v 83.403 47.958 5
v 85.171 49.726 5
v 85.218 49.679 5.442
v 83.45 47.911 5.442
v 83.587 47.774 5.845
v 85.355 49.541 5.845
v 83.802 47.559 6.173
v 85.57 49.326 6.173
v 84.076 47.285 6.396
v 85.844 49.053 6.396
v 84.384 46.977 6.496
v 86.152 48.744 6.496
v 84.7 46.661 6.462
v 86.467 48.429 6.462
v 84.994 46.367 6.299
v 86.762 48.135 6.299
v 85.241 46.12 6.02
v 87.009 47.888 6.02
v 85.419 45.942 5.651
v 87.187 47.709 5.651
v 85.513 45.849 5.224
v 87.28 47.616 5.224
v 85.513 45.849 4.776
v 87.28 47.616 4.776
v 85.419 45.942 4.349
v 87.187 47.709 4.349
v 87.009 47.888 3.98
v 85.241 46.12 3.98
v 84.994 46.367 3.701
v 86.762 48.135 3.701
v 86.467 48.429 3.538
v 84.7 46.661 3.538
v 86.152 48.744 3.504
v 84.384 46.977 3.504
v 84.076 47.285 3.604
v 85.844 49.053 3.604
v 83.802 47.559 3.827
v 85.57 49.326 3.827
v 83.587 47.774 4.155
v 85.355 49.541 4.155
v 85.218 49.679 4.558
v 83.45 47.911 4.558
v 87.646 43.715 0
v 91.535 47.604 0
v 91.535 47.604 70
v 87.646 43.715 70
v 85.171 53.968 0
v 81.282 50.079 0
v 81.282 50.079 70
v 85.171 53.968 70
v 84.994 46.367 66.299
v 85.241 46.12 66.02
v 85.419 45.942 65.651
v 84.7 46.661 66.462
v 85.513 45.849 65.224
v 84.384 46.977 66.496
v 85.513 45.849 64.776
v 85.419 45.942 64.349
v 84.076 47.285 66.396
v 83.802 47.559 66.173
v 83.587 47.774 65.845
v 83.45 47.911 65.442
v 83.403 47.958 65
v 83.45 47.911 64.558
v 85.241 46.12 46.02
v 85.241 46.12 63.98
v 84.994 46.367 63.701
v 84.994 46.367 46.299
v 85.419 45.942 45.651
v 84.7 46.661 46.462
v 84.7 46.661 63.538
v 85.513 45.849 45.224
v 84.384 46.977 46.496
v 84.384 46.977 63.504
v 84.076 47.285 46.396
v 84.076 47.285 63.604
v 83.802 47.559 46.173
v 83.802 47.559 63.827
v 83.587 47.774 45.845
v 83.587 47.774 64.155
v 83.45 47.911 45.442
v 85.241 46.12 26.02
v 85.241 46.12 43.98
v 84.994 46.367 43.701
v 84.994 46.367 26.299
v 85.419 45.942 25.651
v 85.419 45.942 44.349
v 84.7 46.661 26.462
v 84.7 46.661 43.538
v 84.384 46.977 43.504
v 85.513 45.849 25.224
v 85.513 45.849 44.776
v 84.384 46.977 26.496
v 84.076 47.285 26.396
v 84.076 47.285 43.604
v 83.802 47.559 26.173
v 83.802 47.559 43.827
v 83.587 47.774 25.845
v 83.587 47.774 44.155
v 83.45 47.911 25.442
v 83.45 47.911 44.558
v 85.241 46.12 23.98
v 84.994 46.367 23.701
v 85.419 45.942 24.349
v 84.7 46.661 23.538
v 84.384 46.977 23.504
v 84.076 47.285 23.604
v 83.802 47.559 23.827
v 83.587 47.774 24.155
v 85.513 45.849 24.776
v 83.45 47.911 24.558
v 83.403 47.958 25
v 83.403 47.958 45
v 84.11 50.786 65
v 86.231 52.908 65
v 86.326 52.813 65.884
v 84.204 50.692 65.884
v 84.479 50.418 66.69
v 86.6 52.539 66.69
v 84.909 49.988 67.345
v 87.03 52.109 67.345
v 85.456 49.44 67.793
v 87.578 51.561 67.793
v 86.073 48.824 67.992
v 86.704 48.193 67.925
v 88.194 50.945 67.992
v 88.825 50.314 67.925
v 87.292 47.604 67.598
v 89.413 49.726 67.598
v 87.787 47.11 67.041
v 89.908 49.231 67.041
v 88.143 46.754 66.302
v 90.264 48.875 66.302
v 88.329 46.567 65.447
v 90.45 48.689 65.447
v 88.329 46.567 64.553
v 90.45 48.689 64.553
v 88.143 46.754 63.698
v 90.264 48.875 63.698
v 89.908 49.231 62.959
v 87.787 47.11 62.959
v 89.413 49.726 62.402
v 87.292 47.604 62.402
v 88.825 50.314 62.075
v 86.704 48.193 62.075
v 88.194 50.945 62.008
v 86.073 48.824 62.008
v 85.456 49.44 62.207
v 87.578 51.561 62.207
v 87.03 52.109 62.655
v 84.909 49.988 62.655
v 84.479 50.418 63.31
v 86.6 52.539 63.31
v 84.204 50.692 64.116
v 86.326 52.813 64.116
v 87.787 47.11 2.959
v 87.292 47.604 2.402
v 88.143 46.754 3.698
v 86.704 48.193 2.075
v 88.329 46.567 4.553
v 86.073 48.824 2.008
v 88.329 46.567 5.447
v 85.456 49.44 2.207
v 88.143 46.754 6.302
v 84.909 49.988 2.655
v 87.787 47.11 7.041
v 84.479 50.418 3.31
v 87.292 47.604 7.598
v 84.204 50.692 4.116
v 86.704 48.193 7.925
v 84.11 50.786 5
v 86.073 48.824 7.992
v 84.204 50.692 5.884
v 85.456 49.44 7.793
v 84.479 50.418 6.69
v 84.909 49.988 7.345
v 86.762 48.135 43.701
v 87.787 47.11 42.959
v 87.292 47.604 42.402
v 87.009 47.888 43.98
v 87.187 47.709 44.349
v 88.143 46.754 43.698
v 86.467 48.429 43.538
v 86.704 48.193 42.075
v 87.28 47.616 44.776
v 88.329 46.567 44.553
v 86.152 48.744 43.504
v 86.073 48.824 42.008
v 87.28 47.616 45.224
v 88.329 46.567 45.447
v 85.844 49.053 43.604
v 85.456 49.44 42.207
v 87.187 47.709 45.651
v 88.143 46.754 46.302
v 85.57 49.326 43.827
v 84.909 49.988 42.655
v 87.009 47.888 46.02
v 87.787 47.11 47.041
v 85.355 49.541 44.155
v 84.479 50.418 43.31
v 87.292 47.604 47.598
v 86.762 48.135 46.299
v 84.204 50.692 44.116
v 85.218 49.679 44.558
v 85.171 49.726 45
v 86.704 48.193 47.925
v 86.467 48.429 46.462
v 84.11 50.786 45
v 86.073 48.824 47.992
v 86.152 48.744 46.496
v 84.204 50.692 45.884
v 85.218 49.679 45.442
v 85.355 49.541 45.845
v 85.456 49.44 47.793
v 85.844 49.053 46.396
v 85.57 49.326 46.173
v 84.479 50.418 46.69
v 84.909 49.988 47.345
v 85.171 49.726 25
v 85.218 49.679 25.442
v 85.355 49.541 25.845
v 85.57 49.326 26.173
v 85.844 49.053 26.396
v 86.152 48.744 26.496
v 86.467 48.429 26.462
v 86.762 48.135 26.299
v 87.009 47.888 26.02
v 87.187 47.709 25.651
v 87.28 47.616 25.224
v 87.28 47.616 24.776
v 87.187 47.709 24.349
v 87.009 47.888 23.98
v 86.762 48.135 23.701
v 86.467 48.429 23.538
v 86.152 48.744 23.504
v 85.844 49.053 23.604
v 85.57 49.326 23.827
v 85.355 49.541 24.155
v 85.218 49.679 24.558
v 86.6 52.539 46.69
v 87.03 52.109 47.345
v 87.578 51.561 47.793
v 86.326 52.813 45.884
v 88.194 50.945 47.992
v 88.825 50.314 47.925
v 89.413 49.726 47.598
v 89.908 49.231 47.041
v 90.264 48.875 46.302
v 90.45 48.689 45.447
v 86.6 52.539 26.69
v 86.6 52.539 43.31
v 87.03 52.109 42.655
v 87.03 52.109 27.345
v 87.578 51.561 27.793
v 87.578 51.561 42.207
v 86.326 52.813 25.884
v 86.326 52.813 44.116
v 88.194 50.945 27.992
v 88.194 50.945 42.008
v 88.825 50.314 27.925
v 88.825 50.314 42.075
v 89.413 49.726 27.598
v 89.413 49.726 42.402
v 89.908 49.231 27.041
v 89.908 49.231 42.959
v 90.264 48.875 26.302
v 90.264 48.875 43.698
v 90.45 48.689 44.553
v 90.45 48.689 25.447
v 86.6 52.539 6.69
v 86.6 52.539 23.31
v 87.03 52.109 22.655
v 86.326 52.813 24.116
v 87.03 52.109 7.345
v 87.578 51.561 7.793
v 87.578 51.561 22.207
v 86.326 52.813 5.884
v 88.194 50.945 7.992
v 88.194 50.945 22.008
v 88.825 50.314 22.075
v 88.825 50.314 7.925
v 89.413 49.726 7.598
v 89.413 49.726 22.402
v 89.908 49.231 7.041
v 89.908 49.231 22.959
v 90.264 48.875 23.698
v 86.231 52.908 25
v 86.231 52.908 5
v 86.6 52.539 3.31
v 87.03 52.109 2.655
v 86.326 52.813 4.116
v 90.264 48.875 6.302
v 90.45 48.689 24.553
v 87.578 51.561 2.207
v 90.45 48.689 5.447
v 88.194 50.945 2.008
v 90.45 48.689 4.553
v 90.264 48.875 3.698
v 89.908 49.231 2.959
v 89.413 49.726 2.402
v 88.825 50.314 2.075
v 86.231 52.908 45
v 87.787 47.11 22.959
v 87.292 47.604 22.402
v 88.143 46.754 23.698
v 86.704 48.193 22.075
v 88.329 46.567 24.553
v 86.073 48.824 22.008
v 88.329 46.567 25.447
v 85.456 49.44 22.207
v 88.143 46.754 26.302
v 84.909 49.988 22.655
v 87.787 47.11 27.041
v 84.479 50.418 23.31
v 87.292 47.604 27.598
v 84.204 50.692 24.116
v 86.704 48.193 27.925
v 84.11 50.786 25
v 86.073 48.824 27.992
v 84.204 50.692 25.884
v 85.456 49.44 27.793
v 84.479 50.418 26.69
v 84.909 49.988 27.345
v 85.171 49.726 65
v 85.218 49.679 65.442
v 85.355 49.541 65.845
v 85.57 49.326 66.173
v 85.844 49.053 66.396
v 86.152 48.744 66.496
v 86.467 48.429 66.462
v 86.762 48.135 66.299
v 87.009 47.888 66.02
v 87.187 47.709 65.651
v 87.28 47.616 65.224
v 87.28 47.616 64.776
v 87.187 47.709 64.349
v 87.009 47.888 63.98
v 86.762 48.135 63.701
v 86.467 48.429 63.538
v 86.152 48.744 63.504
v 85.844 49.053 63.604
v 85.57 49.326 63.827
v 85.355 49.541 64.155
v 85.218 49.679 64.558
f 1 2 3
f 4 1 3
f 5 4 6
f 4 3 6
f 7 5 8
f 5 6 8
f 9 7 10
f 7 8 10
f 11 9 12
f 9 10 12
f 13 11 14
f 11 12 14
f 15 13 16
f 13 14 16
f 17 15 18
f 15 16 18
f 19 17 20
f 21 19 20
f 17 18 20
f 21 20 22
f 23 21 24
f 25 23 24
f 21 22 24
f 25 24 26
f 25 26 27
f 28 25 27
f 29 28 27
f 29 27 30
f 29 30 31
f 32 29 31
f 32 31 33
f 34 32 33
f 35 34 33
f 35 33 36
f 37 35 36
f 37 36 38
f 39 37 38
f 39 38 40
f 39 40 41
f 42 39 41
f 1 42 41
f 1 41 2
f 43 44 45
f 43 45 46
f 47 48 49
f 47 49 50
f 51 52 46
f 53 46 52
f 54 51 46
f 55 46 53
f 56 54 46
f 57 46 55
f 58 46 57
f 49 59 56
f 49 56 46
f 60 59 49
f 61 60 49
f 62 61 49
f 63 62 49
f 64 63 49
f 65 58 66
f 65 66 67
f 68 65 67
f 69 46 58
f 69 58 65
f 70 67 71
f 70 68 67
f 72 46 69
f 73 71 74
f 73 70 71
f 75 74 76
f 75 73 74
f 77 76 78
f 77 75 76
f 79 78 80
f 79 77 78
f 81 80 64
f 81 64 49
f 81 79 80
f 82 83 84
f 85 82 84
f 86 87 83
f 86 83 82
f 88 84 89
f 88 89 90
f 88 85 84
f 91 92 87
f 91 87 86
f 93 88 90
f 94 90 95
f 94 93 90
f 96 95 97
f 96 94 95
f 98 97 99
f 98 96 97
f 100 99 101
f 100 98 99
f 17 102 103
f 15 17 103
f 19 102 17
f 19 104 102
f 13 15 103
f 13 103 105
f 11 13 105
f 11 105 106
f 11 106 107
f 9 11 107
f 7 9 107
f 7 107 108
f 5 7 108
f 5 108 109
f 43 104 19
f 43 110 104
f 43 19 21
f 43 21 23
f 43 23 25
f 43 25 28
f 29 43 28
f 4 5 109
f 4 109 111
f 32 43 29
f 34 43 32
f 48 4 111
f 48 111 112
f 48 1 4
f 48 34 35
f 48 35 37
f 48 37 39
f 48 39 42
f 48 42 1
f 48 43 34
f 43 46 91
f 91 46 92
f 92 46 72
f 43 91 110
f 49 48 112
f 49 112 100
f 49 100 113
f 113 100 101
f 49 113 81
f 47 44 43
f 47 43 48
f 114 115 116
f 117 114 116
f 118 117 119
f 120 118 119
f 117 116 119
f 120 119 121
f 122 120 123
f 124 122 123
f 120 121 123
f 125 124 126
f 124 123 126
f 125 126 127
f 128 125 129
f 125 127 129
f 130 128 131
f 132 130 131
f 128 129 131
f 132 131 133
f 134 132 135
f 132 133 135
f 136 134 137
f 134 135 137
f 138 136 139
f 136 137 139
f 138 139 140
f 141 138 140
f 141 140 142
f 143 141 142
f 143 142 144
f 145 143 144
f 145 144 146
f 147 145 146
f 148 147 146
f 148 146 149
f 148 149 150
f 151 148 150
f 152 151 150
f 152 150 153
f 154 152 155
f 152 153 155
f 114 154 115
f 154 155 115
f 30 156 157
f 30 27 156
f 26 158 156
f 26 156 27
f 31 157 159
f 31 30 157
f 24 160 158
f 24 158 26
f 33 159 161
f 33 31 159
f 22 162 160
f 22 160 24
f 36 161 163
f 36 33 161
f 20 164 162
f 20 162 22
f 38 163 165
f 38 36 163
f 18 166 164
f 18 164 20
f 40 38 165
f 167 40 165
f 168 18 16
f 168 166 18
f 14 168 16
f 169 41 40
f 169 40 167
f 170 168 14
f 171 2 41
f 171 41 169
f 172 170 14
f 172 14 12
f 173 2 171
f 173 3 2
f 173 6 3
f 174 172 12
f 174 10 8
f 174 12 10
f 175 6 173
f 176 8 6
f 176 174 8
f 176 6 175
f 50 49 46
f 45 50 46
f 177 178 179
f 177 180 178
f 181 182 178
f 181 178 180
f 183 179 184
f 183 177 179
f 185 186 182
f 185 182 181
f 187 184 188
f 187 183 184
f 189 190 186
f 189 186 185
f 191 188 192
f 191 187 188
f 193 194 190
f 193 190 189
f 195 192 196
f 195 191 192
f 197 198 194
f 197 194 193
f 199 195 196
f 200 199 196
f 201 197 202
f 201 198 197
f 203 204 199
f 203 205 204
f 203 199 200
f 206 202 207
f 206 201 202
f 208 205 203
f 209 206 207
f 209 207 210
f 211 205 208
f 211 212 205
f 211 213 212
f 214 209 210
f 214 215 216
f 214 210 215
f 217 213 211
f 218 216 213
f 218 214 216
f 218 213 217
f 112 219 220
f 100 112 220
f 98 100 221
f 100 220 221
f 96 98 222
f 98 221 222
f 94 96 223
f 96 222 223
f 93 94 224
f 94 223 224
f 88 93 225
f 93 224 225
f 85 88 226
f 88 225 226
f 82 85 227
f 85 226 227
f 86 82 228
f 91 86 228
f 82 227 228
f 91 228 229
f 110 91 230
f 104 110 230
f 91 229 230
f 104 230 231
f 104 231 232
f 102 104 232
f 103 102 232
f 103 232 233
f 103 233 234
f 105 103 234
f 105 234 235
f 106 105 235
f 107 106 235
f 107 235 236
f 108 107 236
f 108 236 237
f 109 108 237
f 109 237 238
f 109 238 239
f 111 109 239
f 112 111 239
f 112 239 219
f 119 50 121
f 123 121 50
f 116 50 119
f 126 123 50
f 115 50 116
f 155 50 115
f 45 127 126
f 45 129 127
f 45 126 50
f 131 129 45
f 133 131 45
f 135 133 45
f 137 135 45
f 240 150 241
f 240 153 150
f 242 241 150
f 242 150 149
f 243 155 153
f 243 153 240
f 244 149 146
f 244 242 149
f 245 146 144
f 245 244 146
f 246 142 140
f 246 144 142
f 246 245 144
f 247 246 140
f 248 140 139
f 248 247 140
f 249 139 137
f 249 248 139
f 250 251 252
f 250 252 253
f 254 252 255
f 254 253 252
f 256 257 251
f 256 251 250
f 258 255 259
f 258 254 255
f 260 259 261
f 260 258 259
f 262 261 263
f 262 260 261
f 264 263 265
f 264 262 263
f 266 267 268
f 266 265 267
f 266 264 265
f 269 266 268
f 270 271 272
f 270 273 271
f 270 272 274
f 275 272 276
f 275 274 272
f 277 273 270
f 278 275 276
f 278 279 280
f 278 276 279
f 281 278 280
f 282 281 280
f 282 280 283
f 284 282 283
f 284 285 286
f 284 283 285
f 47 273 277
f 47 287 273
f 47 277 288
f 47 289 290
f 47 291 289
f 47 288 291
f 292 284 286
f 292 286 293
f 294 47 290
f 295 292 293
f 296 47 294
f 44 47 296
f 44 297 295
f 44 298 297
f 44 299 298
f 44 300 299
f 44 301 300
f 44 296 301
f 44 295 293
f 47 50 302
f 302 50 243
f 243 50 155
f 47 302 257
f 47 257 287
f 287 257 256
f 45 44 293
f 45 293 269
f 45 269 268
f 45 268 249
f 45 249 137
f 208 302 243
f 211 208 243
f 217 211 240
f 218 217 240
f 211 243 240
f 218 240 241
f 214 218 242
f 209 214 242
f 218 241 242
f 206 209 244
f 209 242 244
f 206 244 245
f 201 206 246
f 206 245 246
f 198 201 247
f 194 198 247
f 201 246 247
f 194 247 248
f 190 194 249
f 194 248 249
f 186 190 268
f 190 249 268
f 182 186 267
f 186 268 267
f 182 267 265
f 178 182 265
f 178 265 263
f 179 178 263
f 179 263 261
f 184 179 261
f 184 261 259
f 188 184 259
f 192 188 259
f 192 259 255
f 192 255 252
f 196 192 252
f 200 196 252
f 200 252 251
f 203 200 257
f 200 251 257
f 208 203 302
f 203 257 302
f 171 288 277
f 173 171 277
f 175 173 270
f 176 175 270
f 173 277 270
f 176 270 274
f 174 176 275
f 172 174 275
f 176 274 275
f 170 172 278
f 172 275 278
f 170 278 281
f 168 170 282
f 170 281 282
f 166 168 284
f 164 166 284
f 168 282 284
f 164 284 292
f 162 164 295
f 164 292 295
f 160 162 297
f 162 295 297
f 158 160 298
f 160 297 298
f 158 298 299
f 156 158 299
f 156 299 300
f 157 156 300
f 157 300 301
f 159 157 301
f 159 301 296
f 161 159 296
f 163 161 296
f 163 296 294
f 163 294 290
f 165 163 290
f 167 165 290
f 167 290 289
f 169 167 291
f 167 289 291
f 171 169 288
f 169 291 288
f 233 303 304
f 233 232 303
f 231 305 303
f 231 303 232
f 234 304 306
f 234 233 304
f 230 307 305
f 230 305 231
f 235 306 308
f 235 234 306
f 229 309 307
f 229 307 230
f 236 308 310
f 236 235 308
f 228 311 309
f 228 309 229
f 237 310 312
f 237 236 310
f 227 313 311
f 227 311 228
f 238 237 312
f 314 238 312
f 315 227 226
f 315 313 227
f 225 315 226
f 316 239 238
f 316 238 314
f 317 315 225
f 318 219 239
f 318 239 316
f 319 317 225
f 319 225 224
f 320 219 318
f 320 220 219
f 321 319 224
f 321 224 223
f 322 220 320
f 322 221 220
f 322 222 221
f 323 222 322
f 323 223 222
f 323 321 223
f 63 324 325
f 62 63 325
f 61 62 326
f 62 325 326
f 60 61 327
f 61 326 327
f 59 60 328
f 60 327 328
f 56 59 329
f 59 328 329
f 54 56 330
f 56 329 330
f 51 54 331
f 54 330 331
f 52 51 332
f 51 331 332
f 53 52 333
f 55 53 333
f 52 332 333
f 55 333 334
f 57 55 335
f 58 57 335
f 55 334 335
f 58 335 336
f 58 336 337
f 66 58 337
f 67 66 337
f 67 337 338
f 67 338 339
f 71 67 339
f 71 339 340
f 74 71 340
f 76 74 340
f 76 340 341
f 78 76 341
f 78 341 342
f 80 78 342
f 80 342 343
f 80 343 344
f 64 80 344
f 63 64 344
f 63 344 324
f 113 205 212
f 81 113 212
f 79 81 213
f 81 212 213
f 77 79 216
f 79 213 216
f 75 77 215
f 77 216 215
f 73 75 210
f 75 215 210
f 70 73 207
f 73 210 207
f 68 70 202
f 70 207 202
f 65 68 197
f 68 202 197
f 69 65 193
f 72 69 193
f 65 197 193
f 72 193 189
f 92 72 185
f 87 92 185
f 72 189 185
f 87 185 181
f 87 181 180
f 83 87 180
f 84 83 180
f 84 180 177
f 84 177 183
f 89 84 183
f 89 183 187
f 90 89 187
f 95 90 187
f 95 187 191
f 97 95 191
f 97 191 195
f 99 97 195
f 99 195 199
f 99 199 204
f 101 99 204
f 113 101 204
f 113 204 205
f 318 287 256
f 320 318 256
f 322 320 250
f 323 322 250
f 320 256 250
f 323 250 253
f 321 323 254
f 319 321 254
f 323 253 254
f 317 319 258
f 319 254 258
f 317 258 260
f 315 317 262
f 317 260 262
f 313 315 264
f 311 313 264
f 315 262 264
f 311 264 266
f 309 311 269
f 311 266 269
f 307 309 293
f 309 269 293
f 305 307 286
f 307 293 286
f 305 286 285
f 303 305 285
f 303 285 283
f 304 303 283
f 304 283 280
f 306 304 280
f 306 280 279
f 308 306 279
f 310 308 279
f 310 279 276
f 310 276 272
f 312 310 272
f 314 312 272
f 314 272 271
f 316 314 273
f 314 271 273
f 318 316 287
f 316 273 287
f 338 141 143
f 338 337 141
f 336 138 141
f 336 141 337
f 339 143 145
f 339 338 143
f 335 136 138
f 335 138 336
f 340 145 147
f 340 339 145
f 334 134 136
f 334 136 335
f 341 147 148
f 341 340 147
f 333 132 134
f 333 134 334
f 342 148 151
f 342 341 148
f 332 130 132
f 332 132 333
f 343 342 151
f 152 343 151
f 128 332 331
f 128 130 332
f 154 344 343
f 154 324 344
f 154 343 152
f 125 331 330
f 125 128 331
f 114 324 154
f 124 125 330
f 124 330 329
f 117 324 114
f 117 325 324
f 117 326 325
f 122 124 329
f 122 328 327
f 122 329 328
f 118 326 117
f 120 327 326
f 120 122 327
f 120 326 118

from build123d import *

# Parameters (mm, degrees)
EXTRUDE_2_DEPTH     = 75
SKETCH_5_R          = 1.5
CUT_EXTRUDE_1_DEPTH = 75
SKETCH_7_R          = 3
CUT_EXTRUDE_2_DEPTH = 3
CUT_EXTRUDE_3_DEPTH = 5


with BuildPart() as part:
    # Model → 凸台-拉伸2 (new body)
    with BuildSketch(Plane.XY):
        Polygon((81.281714853, 50.079307879), (85.170802149, 53.968395176), (91.53476318, 47.604434145), (87.645675883, 43.715346849), align=None)
    extrude(amount=EXTRUDE_2_DEPTH)

    # 草图5 → 切除-拉伸1 (cut)
    with BuildSketch(Plane(origin=(69.569598662, 69.569598663, 0), x_dir=(0, 0, -1), z_dir=(0.7071067811850318, 0.7071067811880632, 0))):
        with Locations(Location((-65, -26.56343356, 0), (0, 0, 90))):
            Circle(SKETCH_5_R)
        with Locations(Location((-45, -26.56343356, 0), (0, 0, 90))):
            Circle(SKETCH_5_R)
        with Locations(Location((-25, -26.56343356, 0), (0, 0, 90))):
            Circle(SKETCH_5_R)
        with Locations(Location((-5, -26.56343356, 0), (0, 0, 90))):
            Circle(SKETCH_5_R)
    extrude(amount=-CUT_EXTRUDE_1_DEPTH, mode=Mode.SUBTRACT)

    # 草图7 → 切除-拉伸2 (cut)
    with BuildSketch(Plane(origin=(69.569598662, 69.569598663, 0), x_dir=(0, 0, -1), z_dir=(0.7071067811850318, 0.7071067811880632, 0))):
        with Locations(Location((-5, -26.56343356, 0), (0, 0, 90))):
            Circle(SKETCH_7_R)
        with Locations(Location((-25, -26.56343356, 0), (0, 0, 90))):
            Circle(SKETCH_7_R)
        with Locations(Location((-45, -26.56343356, 0), (0, 0, 90))):
            Circle(SKETCH_7_R)
        with Locations(Location((-65, -26.56343356, 0), (0, 0, 90))):
            Circle(SKETCH_7_R)
    extrude(amount=-CUT_EXTRUDE_2_DEPTH, mode=Mode.SUBTRACT)

    # 草图8 → 切除-拉伸3 (cut)
    with BuildSketch(Plane.XY.offset(75)):
        Polygon((87.645675883, 43.715346849), (91.53476318, 47.604434145), (85.134022188, 54.005175138), (81.244934891, 50.116087842), align=None)
    extrude(amount=-CUT_EXTRUDE_3_DEPTH, mode=Mode.SUBTRACT)


solid = part.part
